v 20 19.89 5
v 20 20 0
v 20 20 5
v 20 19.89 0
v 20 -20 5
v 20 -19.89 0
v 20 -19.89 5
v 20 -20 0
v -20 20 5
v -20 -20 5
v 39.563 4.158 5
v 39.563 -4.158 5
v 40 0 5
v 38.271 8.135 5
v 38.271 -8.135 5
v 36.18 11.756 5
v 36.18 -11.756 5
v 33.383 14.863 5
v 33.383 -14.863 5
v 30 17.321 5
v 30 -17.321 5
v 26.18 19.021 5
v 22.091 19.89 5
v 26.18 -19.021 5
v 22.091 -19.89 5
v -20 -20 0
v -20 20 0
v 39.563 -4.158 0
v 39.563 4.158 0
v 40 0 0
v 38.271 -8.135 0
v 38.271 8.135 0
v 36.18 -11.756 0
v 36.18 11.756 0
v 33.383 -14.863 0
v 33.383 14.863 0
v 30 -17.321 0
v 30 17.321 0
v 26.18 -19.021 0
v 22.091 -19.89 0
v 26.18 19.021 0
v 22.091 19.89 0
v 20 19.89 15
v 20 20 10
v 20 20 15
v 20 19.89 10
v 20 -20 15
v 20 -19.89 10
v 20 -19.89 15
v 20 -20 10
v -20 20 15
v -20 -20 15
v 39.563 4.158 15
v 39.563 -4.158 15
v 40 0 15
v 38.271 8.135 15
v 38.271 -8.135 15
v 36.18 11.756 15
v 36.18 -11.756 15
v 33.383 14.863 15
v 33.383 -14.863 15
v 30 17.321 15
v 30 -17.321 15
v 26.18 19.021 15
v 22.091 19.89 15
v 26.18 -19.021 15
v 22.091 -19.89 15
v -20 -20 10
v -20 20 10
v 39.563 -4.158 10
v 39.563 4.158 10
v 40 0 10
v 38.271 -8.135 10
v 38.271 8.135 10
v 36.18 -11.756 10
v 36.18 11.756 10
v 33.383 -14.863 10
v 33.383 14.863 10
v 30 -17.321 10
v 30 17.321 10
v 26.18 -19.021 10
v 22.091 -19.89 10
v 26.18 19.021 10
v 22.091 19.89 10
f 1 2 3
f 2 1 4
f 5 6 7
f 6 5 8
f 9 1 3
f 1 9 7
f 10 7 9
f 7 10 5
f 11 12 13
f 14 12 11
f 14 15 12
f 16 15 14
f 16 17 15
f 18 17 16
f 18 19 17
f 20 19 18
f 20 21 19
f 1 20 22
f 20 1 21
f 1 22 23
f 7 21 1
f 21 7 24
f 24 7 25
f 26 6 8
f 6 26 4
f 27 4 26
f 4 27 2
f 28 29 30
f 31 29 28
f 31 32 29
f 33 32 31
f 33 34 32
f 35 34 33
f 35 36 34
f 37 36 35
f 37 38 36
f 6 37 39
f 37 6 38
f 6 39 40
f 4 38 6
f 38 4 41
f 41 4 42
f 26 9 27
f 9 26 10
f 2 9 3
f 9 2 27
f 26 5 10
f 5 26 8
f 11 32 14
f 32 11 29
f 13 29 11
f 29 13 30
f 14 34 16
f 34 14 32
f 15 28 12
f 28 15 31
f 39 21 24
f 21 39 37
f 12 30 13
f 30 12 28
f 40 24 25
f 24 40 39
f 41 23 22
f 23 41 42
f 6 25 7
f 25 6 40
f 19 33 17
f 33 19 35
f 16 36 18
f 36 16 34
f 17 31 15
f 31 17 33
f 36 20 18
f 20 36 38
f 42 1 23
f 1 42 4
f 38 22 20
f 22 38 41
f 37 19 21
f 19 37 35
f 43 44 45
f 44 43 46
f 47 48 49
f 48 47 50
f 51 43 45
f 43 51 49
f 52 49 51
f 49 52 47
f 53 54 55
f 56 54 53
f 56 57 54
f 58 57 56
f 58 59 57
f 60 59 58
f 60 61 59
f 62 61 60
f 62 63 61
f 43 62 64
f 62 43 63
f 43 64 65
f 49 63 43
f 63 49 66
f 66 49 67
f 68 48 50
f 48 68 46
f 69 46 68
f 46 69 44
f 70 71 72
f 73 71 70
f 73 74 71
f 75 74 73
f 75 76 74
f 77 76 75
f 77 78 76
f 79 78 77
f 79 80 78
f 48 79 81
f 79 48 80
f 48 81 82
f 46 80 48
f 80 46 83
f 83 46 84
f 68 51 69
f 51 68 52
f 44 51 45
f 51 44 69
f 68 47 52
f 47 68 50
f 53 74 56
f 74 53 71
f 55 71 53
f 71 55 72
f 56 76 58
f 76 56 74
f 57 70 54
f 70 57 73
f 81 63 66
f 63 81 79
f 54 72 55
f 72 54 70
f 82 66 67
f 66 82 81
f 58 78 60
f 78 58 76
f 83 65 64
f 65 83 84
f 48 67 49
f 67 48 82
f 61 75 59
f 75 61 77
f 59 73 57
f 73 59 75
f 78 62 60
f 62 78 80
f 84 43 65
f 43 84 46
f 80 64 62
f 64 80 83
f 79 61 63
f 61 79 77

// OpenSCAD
// generate various floating objects to generate support under

slice_thickness = 5;
float_distance = 5;
width = 40;
radius = width/2;

union() {
  translate([-radius, -radius, 0])
  cube([width, width, slice_thickness]);
  translate([radius, 0, 0])
  cylinder(r=radius, h=slice_thickness);
}

translate([0, 0, float_distance + slice_thickness])
union() {
  translate([-radius, -radius, 0])
  cube([width, width, slice_thickness]);
  translate([radius, 0, 0])
  cylinder(r=radius, h=slice_thickness);
}
